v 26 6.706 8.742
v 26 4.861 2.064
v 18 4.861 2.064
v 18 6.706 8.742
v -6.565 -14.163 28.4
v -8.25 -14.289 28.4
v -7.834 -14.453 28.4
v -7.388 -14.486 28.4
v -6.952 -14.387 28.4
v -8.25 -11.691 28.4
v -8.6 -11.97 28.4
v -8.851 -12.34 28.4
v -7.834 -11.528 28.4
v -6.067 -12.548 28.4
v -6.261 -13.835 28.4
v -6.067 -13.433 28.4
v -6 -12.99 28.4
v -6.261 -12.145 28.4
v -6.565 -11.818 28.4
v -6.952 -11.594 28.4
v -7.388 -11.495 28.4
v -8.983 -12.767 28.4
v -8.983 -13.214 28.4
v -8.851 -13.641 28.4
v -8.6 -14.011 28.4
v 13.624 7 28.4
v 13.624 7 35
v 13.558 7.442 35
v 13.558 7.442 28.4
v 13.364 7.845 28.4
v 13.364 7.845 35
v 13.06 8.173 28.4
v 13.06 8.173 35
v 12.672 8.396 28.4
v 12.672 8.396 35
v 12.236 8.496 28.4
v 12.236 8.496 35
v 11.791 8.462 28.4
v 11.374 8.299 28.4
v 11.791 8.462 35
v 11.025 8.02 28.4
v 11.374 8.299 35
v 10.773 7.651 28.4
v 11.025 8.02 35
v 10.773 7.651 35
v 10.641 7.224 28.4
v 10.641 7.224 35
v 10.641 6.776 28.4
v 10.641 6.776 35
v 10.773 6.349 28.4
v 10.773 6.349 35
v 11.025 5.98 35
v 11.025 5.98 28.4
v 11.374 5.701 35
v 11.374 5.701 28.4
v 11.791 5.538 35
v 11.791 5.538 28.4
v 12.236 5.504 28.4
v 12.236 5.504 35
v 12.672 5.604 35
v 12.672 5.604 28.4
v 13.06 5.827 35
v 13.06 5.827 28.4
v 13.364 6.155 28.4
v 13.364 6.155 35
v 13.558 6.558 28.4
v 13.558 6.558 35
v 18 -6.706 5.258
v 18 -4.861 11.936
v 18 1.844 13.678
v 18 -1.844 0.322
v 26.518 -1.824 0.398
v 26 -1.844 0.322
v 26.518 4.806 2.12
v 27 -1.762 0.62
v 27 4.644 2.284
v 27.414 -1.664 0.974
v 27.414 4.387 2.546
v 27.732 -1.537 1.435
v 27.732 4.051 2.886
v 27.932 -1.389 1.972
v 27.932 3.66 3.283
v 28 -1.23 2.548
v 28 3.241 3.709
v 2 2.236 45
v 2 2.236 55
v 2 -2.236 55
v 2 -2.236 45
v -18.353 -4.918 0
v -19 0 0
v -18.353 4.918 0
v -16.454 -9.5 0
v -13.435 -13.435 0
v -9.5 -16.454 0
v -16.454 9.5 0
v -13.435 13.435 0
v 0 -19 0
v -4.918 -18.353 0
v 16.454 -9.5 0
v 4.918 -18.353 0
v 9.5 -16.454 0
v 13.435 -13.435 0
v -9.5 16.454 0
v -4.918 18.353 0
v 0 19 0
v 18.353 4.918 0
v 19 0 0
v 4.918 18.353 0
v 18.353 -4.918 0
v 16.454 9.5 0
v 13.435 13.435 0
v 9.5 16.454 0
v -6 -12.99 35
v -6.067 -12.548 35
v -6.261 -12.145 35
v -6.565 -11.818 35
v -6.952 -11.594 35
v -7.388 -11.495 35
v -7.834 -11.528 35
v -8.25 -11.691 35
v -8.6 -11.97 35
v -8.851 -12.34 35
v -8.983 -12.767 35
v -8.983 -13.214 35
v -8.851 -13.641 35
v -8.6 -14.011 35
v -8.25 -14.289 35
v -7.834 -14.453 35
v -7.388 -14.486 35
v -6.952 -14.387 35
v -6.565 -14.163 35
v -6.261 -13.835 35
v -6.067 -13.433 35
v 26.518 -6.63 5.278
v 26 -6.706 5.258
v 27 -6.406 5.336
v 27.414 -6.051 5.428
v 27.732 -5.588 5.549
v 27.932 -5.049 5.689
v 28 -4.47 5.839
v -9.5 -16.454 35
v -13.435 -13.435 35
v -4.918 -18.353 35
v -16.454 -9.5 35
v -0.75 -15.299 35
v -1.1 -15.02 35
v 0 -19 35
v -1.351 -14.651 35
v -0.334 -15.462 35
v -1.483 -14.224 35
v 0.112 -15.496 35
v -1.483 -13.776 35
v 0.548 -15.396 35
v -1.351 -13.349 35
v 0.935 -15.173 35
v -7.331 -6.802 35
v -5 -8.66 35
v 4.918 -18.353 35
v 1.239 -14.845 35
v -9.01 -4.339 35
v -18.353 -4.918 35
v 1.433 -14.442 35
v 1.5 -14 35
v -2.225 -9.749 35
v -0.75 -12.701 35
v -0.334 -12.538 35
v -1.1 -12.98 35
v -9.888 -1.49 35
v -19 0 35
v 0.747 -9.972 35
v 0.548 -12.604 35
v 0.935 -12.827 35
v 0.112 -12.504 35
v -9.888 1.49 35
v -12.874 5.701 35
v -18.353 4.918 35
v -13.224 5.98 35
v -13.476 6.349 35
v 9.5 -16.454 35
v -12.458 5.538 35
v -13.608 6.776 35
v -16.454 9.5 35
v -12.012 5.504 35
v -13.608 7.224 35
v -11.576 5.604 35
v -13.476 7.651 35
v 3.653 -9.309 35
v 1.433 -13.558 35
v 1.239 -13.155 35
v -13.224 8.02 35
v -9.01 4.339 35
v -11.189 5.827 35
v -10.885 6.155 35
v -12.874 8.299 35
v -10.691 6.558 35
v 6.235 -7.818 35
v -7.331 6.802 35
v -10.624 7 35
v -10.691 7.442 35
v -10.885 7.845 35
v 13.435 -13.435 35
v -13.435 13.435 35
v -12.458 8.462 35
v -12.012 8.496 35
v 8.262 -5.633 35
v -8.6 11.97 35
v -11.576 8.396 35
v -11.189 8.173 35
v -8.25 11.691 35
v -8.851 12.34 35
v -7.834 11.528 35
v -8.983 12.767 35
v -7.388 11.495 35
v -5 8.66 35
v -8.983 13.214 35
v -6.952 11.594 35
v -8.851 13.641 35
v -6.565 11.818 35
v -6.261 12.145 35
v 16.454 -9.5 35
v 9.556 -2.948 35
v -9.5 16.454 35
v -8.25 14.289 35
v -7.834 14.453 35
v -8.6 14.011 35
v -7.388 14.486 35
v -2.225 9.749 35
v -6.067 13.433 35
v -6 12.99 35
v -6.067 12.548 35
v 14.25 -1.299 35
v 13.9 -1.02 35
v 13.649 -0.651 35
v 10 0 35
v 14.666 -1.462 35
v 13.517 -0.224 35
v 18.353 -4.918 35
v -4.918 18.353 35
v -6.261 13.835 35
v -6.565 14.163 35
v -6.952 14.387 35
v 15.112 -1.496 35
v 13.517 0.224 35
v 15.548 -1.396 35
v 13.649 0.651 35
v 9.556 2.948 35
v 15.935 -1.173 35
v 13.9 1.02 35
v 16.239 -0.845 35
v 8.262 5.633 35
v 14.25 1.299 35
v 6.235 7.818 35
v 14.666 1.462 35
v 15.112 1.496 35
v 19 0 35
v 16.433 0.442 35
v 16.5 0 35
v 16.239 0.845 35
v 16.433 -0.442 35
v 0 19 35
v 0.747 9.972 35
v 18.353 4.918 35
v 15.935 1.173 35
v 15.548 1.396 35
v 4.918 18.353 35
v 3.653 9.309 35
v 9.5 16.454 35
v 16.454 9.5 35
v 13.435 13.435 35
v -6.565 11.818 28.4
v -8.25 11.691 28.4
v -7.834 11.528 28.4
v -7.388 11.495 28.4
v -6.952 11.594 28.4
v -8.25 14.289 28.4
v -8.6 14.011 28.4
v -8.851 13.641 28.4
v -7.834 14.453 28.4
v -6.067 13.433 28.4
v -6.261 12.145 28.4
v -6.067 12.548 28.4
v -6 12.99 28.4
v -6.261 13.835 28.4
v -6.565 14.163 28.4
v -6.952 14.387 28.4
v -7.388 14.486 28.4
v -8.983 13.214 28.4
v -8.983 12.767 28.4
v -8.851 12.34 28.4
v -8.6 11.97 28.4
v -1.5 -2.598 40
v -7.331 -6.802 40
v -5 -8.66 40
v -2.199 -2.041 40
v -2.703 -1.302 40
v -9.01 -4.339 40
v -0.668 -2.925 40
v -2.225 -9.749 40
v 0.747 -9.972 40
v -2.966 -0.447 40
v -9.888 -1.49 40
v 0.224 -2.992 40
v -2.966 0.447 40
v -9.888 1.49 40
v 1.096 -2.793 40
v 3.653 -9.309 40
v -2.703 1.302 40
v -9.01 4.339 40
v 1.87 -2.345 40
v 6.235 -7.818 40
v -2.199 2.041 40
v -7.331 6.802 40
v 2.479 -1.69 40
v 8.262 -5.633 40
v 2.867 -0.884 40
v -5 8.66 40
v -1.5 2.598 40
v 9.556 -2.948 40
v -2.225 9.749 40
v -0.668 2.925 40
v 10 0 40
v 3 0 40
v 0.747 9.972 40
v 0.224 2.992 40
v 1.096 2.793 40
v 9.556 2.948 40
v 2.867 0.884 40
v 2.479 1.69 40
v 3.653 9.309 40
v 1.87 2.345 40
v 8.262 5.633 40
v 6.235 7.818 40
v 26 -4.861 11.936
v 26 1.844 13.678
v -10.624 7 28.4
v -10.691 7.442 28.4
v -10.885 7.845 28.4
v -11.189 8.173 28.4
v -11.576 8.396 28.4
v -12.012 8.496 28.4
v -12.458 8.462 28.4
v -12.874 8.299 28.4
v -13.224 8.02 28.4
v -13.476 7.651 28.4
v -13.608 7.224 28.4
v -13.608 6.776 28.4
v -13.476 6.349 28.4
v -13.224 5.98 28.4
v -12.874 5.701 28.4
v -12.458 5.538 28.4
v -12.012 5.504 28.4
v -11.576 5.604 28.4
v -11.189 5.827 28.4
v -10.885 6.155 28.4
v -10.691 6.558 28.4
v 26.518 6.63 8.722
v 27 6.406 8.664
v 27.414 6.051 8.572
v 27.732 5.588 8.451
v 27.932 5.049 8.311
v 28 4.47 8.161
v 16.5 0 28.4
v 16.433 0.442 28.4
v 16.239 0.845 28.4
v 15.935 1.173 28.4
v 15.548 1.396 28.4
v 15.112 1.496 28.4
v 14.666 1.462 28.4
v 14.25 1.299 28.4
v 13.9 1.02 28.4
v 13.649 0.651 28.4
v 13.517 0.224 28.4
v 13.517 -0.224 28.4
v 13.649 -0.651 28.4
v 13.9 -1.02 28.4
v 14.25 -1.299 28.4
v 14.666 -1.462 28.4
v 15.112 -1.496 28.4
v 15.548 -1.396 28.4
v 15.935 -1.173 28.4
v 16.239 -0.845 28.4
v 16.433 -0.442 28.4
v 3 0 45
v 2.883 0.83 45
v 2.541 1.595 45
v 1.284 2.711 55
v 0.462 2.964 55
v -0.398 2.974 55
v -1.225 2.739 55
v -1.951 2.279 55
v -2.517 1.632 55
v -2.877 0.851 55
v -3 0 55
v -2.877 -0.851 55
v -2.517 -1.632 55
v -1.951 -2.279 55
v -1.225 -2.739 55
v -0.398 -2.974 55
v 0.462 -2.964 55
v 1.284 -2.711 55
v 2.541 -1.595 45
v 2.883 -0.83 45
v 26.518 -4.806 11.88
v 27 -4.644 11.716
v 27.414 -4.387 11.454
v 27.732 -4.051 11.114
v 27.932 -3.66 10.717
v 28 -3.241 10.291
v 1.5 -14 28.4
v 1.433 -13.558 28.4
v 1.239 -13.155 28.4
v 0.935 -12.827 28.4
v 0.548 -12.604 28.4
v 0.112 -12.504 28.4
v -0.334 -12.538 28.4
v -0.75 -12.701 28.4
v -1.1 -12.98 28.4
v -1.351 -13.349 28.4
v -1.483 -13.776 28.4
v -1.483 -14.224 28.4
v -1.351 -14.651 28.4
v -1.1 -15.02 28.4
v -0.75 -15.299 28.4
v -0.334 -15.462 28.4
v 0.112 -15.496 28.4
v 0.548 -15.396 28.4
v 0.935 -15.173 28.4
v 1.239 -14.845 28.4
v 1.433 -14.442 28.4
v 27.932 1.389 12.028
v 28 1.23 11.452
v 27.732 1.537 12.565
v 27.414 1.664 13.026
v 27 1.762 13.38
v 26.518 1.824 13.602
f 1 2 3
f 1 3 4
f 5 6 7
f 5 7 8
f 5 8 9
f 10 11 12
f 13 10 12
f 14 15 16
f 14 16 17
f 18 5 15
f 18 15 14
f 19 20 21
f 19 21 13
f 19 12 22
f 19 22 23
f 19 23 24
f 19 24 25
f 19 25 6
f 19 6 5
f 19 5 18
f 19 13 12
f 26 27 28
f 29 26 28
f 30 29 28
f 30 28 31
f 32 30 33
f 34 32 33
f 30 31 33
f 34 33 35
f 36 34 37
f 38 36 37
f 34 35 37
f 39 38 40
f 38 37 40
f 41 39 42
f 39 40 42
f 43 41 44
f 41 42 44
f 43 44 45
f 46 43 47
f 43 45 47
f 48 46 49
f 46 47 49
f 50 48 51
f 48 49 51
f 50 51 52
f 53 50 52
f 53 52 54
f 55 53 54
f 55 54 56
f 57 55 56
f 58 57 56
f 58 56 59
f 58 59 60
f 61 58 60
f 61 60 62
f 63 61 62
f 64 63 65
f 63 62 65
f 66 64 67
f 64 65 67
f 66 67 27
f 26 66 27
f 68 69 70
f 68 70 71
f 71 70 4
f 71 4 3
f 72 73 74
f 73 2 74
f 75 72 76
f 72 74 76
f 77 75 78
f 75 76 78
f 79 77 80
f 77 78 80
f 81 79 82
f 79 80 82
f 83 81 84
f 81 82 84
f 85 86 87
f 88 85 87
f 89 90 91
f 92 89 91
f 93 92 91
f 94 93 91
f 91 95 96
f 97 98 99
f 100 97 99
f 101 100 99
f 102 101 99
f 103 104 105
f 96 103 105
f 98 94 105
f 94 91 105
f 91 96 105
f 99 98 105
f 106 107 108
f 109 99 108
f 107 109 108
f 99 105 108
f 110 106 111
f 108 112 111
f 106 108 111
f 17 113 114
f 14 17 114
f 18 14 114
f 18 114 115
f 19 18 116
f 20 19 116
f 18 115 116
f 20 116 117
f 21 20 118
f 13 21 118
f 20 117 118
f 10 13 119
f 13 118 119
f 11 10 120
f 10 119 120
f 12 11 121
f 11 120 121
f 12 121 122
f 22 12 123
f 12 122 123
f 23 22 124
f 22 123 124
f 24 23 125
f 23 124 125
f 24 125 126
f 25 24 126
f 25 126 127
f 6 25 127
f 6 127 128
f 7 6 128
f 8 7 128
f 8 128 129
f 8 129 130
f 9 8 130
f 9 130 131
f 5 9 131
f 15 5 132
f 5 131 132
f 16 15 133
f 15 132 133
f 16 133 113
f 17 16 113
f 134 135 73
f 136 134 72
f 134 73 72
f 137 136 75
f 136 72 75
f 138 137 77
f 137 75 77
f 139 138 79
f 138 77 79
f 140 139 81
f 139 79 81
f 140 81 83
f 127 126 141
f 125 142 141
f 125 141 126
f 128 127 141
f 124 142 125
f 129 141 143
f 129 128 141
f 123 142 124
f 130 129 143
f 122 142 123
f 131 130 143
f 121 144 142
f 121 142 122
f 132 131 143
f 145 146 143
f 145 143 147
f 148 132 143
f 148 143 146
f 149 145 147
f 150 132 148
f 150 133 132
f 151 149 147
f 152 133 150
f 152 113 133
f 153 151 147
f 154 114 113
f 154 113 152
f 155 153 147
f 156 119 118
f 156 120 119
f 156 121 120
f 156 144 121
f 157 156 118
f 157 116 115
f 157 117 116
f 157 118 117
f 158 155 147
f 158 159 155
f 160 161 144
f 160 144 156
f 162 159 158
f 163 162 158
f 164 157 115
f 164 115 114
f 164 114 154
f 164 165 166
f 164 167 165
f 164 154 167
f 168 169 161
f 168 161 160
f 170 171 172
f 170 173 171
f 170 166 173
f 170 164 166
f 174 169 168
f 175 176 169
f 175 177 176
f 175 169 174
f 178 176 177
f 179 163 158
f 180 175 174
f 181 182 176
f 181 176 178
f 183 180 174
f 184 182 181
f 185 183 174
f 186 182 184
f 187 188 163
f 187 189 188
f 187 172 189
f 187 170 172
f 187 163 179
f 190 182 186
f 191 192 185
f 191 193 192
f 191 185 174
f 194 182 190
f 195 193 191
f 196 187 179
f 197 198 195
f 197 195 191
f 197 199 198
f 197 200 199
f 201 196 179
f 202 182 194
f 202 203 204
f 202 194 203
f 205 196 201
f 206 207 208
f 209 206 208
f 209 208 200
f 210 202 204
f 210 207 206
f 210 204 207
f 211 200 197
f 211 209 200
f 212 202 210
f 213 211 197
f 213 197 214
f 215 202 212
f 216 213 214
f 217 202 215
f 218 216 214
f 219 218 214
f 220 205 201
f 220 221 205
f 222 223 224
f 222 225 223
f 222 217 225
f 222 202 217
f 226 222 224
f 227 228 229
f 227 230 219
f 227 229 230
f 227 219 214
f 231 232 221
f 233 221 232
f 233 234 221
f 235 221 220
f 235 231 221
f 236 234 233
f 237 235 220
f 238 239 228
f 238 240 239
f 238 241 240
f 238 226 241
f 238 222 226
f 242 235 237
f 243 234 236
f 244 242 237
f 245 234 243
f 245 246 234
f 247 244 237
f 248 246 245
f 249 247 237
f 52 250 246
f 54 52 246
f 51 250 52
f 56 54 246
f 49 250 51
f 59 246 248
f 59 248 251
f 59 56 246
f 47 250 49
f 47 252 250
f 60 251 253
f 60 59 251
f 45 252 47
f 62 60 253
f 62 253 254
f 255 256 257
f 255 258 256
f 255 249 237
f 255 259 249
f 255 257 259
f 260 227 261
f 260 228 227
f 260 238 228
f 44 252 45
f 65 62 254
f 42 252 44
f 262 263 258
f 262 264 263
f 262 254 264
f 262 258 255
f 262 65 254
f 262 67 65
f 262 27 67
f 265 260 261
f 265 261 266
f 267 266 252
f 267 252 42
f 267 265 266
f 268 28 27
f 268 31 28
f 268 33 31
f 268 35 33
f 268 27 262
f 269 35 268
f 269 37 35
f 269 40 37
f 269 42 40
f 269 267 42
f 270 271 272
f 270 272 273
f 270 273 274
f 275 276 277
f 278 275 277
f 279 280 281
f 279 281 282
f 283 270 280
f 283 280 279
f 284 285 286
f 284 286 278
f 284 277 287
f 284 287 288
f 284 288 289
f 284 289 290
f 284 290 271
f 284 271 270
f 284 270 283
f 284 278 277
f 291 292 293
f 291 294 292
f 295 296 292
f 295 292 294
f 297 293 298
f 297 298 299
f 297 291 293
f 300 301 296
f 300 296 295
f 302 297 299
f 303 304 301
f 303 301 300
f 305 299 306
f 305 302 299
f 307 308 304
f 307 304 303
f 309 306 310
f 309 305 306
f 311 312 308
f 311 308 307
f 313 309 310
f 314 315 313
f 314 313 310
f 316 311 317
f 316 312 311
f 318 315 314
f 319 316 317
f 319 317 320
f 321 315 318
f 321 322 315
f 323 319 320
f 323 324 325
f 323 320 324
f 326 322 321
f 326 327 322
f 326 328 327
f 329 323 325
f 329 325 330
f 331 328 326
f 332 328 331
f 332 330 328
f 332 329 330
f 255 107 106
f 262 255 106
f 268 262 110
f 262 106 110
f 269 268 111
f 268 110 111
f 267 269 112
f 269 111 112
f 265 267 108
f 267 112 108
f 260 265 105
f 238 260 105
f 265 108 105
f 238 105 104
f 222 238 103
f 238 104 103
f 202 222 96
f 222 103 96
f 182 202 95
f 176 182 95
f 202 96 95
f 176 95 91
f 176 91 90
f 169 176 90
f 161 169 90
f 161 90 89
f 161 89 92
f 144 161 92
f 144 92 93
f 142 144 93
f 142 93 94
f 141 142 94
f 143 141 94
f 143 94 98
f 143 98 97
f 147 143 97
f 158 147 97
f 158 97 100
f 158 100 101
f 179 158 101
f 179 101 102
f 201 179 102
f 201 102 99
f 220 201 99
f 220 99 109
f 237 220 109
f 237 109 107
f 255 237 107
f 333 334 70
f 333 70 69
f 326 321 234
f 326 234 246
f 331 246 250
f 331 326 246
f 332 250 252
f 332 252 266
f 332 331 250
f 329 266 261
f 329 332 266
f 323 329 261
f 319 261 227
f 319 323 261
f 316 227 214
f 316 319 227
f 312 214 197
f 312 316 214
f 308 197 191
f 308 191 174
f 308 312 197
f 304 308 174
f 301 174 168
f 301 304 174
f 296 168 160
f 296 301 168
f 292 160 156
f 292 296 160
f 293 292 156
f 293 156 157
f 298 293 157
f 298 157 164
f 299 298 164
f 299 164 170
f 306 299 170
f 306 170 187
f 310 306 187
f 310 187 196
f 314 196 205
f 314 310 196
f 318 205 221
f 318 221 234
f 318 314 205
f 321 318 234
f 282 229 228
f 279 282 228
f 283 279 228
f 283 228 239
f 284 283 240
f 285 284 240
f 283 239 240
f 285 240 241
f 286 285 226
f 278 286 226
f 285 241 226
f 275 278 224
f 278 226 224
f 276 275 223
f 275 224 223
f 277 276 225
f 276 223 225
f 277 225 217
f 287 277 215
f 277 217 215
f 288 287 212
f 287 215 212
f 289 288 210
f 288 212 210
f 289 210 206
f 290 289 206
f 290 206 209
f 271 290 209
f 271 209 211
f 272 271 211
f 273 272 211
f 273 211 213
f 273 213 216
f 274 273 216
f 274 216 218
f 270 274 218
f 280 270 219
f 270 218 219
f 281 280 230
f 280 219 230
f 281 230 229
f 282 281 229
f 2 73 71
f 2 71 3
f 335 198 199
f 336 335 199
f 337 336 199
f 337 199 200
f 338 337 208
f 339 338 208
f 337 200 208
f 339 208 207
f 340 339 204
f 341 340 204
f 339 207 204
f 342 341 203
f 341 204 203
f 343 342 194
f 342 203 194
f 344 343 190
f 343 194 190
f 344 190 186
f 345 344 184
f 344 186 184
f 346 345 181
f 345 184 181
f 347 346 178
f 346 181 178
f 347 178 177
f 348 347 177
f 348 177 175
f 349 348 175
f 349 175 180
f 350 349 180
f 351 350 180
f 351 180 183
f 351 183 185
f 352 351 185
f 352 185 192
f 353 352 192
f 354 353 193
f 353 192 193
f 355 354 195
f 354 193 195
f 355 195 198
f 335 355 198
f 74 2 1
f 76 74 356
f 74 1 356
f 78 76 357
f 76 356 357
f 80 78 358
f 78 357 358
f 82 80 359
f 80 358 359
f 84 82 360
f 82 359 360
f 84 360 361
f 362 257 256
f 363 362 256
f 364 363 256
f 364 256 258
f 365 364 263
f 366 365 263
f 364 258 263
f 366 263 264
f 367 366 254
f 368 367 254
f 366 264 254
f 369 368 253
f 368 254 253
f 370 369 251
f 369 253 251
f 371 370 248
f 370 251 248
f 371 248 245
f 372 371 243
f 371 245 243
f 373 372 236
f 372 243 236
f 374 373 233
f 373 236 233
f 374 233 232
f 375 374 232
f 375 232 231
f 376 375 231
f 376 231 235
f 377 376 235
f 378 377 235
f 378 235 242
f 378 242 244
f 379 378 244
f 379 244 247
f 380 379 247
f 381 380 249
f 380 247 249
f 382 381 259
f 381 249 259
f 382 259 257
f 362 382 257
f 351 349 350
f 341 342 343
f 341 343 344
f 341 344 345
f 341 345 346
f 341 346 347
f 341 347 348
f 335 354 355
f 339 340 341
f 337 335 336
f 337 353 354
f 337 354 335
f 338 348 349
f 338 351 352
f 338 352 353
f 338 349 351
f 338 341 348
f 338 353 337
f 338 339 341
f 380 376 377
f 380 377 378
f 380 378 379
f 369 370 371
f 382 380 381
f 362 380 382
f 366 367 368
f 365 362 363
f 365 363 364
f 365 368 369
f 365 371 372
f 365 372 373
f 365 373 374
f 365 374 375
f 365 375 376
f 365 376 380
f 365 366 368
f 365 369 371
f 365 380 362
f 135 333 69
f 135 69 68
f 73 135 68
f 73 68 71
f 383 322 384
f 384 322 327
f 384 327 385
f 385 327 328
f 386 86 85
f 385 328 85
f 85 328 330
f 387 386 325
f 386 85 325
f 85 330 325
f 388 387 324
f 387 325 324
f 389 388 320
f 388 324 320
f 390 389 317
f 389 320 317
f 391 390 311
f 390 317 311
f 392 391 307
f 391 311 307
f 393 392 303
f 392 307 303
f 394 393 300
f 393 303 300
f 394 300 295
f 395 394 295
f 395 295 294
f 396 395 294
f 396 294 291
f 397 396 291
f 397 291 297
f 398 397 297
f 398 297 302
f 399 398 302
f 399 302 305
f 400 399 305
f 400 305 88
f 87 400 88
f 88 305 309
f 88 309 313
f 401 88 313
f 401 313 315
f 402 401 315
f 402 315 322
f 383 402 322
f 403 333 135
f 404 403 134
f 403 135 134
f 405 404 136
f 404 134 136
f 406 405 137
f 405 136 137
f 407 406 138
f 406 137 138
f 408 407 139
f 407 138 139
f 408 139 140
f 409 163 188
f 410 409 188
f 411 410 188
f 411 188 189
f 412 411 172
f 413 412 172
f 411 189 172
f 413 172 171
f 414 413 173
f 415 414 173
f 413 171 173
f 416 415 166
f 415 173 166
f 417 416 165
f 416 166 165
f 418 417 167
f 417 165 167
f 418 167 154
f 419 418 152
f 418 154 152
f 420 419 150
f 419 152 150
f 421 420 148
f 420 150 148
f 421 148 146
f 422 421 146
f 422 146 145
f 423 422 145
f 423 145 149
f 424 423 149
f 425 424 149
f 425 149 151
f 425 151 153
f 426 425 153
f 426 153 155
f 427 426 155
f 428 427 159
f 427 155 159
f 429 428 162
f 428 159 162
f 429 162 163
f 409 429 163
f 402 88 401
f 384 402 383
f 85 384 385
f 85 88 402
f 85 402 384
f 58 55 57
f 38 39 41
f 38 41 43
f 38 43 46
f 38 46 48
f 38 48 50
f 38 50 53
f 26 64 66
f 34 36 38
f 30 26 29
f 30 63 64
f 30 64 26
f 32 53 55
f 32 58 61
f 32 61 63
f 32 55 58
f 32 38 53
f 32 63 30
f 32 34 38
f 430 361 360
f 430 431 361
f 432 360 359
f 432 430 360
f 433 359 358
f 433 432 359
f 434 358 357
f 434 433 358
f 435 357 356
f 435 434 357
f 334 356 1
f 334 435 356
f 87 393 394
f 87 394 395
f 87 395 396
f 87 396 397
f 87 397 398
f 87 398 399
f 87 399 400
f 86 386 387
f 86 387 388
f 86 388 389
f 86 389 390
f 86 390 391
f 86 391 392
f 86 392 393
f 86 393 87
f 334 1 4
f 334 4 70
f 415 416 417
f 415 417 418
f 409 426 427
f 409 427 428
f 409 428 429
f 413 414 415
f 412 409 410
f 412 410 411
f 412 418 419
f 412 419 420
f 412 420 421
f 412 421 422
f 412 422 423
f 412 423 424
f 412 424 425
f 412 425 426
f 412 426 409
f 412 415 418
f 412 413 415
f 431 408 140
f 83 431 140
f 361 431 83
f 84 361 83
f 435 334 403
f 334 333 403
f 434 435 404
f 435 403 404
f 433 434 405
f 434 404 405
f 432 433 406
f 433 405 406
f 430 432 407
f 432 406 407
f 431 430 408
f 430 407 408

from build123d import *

# Parameters (mm, degrees)
SKETCH3_R                = 19
BOSS_EXTRUDE1_DEPTH      = 40
SKETCH4_R                = 19
SKETCH4_R_2              = 10
CUT_EXTRUDE1_DEPTH       = 5
SKETCH6_R                = 1.5
CUT_EXTRUDE2_DEPTH       = 6.6
SKETCH5_R                = 3
BOSS_EXTRUDE2_DEPTH      = 15
BOSS_EXTRUDE3_DEPTH      = 9
BOSS_EXTRUDE3_DEPTH_BACK = 1
FILLET1_R                = 2
CUT_EXTRUDE3_DEPTH       = 10


with BuildPart() as part:
    # Sketch3 → Boss-Extrude1 (new body)
    with BuildSketch(Plane.XY):
        Circle(SKETCH3_R)
    extrude(amount=BOSS_EXTRUDE1_DEPTH)

    # Sketch4 → Cut-Extrude1 (cut)
    with BuildSketch(Plane.XY.offset(40)):
        Circle(SKETCH4_R)
        Circle(SKETCH4_R_2, mode=Mode.SUBTRACT)
    extrude(amount=-CUT_EXTRUDE1_DEPTH, mode=Mode.SUBTRACT)

    # Sketch6 → Cut-Extrude2 (cut)
    with BuildSketch(Plane.XY.offset(35)):
        with Locations((15, 0)):
            Circle(SKETCH6_R)
        with Locations((-7.5, -12.990381057)):
            Circle(SKETCH6_R)
        with Locations((-7.5, 12.990381057)):
            Circle(SKETCH6_R)
        with Locations((12.124355653, 7)):
            Circle(SKETCH6_R)
        with Locations((-12.124355653, 7)):
            Circle(SKETCH6_R)
        with Locations((0, -14)):
            Circle(SKETCH6_R)
    extrude(amount=-CUT_EXTRUDE2_DEPTH, mode=Mode.SUBTRACT)

    # Sketch5 → Boss-Extrude2 (add)
    with BuildSketch(Plane.XY.offset(40)):
        Circle(SKETCH5_R)
    extrude(amount=BOSS_EXTRUDE2_DEPTH)

    # Sketch9 → Cut-Extrude3 (cut)
    with BuildSketch(Plane.XY.offset(55)):
        with BuildLine():
            Line((2, 2.236067977), (2, -2.236067977))
            ThreePointArc((2, -2.236067977), (3, 0), (2, 2.236067977))
        make_face()
    extrude(amount=-CUT_EXTRUDE3_DEPTH, mode=Mode.SUBTRACT)


with BuildPart() as body_2:
    # Sketch8 → Boss-Extrude3 (new body, two sides)
    with BuildSketch(Plane(origin=(19, 0, 0), x_dir=(0, 0, -1), z_dir=(1, 0, 0))) as boss_extrude3_sk:
        Polygon((-2.063552027, 4.861222214), (-8.741717944, 6.705700456), (-13.678165917, 1.844478242), (-11.936447973, -4.861222214), (-5.258282056, -6.705700456), (-0.321834083, -1.844478242), align=None)
    extrude(amount=BOSS_EXTRUDE3_DEPTH)
    extrude(boss_extrude3_sk.sketch, amount=-BOSS_EXTRUDE3_DEPTH_BACK)

    # Fillet1
    fillet1_edges = [body_2.edges().sort_by_distance(p)[0] for p in [
        (28, 1.508371986, 1.192693055),
        (28, 5.783461335, 5.402634986),
        (28, 4.275089349, 11.209941931),
        (28, -1.508371986, 12.807306945),
        (28, -5.783461335, 8.597365014),
        (28, -4.275089349, 2.790058069),
    ]]
    fillet(fillet1_edges, radius=FILLET1_R)


solid = Compound([part.part, body_2.part])
